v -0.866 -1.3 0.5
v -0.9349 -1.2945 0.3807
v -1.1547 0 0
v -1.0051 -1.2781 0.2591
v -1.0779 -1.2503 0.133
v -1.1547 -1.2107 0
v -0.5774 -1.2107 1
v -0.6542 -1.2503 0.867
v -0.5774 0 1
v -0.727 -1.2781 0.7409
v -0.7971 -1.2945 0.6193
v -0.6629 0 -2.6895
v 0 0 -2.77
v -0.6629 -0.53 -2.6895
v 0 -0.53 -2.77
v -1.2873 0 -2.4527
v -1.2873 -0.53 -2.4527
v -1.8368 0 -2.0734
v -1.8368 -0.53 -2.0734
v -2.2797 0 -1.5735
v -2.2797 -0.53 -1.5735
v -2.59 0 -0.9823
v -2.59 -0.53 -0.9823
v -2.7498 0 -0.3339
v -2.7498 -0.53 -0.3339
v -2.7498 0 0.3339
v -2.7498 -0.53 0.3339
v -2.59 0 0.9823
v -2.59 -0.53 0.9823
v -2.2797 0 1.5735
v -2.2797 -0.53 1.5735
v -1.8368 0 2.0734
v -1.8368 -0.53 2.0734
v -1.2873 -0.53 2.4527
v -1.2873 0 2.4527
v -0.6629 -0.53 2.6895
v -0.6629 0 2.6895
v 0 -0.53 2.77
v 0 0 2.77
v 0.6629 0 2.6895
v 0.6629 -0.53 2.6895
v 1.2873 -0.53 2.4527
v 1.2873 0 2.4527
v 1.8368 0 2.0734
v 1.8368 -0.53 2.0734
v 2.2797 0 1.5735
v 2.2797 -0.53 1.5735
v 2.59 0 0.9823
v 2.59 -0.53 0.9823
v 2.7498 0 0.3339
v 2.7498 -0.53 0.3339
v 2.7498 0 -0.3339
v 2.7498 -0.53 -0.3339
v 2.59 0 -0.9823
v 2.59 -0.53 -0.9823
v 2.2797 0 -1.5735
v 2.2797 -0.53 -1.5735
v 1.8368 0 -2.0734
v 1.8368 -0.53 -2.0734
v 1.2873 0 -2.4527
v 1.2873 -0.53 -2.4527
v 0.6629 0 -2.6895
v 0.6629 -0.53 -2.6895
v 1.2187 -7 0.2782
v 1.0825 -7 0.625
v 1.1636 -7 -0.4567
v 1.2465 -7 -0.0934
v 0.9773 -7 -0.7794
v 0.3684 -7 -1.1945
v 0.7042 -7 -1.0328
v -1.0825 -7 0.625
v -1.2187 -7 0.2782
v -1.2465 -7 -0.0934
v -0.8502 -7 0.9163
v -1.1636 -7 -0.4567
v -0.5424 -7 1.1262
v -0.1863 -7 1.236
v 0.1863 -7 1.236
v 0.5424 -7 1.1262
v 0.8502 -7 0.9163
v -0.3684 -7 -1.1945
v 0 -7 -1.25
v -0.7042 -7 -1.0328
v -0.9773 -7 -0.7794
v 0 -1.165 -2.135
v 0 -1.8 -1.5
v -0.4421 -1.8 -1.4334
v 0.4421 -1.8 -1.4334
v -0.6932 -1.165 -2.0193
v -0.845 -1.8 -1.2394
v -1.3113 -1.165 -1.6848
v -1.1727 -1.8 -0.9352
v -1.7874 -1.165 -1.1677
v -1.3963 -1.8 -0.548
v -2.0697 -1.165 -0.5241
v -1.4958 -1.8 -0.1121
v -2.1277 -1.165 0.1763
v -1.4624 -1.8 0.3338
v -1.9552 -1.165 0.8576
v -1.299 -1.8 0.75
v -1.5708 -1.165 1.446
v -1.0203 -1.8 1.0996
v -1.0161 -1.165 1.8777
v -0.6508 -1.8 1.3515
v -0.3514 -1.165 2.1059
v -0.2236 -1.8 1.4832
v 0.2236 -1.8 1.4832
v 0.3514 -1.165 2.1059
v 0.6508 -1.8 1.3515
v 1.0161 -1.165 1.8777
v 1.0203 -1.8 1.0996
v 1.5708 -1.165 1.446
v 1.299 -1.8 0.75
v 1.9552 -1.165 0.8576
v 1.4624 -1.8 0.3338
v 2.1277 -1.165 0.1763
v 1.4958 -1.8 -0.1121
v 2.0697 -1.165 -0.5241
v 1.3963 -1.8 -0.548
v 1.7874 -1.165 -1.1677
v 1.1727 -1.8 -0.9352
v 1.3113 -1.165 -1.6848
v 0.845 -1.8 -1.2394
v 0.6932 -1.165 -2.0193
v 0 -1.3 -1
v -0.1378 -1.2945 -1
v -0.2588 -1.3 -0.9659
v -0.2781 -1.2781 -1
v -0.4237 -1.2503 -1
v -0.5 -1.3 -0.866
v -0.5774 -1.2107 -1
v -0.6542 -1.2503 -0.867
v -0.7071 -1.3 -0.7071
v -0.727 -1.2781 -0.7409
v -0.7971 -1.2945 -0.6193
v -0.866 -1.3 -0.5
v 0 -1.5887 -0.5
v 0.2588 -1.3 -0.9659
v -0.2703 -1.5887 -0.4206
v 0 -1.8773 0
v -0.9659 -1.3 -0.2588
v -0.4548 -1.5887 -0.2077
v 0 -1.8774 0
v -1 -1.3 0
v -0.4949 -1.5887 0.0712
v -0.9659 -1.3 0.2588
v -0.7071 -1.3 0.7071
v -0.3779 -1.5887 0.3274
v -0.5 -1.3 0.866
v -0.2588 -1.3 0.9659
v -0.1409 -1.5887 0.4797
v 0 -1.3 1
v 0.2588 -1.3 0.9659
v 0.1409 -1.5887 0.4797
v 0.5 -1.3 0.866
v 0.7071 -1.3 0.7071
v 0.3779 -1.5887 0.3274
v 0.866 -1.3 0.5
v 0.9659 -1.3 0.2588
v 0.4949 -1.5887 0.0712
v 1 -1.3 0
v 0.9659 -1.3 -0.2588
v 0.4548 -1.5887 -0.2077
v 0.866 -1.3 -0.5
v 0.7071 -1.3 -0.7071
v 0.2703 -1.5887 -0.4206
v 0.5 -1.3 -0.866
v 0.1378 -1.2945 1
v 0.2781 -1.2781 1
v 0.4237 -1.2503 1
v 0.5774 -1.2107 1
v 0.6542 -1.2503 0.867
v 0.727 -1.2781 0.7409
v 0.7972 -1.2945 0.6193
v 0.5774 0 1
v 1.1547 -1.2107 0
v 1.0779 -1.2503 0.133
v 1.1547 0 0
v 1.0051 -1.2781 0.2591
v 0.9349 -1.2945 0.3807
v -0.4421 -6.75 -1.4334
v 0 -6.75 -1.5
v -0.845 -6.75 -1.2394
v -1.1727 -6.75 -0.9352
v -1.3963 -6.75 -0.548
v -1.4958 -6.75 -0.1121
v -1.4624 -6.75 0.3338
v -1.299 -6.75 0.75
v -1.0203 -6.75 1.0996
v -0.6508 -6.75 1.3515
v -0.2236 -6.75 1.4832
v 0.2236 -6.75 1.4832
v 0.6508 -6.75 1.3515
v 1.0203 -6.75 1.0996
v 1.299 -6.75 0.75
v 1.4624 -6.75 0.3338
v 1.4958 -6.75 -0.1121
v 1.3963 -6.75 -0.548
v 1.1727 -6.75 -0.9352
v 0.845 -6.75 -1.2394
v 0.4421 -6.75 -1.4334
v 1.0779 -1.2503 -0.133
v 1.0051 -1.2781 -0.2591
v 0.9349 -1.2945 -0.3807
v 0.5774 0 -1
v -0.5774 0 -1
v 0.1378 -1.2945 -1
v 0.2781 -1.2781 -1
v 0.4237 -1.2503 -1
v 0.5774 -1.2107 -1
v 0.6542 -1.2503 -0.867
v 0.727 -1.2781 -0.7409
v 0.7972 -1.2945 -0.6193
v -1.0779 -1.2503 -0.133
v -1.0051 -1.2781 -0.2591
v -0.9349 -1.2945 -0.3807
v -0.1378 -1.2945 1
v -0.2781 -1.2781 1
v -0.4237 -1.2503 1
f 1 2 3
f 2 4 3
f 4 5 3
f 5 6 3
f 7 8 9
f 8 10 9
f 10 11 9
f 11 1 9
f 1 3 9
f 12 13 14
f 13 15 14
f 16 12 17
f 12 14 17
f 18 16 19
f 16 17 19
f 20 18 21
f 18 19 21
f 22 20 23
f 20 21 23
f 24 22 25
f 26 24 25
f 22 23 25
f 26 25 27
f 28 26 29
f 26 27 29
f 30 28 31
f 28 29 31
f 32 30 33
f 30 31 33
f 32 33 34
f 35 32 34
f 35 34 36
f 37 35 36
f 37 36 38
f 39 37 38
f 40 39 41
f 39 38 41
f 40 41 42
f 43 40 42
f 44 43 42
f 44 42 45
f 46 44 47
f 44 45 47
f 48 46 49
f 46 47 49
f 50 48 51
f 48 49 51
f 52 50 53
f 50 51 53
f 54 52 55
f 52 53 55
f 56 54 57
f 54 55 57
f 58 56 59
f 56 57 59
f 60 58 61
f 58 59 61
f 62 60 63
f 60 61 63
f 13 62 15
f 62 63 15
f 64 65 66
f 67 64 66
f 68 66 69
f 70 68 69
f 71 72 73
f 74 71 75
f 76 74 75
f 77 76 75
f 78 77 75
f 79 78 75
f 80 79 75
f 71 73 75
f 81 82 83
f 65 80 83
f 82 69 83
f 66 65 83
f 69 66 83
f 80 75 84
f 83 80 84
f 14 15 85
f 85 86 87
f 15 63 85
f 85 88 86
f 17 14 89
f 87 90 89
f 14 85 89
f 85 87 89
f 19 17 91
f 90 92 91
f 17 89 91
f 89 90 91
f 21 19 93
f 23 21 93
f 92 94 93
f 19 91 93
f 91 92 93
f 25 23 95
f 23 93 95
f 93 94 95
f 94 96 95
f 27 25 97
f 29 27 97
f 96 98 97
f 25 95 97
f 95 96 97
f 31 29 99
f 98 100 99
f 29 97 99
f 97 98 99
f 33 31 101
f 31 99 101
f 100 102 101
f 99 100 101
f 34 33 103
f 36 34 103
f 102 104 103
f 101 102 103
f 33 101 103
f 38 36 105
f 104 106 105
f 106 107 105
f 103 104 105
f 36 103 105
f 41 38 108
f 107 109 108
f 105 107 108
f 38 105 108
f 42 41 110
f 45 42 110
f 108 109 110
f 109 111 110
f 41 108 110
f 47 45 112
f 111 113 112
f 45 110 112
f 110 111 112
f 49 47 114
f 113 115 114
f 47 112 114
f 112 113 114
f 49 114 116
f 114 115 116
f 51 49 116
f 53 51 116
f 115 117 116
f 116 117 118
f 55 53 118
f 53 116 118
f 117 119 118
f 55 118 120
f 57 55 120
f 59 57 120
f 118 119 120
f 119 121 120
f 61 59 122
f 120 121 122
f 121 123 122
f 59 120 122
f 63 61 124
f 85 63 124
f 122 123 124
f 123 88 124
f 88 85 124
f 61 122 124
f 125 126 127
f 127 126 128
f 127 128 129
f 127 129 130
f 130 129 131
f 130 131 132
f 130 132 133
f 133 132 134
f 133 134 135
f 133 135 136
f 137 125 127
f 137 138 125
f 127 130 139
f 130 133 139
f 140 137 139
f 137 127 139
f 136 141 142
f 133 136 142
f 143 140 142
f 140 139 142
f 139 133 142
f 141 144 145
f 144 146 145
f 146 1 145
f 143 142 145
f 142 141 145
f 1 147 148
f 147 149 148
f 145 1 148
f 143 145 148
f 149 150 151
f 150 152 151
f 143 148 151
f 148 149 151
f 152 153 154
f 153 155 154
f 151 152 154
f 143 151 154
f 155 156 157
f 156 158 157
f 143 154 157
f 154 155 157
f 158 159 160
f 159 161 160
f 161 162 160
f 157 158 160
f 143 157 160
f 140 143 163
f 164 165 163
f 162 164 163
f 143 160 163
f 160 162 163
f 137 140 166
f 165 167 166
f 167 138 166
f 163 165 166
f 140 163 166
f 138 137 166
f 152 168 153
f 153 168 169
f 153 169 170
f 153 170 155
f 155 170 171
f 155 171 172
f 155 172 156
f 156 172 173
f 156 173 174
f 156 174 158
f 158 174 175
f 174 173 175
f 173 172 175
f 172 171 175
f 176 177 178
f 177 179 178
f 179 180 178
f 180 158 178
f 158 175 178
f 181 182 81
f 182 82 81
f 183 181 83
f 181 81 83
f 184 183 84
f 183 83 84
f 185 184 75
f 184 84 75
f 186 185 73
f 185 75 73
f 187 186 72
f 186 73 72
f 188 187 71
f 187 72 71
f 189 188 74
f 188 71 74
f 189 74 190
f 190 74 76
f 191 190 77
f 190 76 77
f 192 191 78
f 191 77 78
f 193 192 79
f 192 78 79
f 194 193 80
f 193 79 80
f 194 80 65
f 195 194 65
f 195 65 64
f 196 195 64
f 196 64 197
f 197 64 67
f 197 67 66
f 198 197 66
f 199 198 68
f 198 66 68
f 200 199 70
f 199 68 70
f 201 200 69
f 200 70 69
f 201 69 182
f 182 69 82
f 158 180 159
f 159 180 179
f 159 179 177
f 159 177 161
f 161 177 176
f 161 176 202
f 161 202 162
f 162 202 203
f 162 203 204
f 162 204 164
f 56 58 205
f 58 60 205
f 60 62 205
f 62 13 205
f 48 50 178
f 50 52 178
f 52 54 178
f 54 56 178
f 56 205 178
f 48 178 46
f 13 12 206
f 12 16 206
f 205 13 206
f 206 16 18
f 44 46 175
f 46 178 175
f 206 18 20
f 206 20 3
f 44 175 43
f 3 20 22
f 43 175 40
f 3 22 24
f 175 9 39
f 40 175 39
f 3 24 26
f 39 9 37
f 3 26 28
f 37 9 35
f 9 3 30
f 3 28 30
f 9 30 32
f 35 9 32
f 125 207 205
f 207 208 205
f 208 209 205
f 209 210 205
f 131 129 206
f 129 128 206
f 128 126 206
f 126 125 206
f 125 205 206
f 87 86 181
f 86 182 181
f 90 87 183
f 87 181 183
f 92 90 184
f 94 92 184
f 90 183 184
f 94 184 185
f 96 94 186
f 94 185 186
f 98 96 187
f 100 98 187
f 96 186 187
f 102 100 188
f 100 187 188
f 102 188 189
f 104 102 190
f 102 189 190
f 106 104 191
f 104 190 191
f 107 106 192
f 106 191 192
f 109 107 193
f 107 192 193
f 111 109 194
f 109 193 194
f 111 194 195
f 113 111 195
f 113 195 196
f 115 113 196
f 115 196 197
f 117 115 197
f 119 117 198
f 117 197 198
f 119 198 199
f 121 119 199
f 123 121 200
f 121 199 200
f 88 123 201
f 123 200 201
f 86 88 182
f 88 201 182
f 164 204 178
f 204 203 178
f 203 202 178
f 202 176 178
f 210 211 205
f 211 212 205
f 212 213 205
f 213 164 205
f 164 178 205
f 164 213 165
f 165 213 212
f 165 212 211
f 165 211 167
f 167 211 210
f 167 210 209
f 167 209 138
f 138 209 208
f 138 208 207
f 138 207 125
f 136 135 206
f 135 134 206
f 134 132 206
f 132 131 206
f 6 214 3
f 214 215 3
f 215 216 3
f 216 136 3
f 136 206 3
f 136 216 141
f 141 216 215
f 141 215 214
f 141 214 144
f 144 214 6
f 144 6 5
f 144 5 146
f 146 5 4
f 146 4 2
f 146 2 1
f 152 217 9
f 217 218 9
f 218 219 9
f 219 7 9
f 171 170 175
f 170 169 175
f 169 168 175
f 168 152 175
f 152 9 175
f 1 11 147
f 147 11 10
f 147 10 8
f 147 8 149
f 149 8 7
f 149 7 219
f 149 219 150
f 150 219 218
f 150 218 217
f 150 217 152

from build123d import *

# Parameters (mm, degrees)
CUT_EXTRUDE_1_REACH = 10.022


with BuildPart() as part:
    # 草图1 → 旋转1 (revolve)
    with BuildSketch(Plane.XY, mode=Mode.PRIVATE) as revolve_1_sk:
        Polygon((1.5, -1.8), (1.5, -6.75), (1.25, -7), (0, -7), (0, -1.877350269), (1, -1.3), (1, 0), (2.77, 0), (2.77, -0.53), align=None)
    revolve(revolve_1_sk.sketch.rotate(Axis((0, 0, 0), (0, 1, 0)), 90), axis=Axis((0, 0, 0), (0, 1, 0)))

    # 切除-拉伸1: up to this cone (the profile starts inside it)
    cut_extrude_1_end = Plane(origin=(0, 0, 0), z_dir=(0, 1, 0)).offset(-1.877349269) * Cone(1.732e-06, 27.108355455, 15.651015319, align=(Align.CENTER, Align.CENTER, Align.MIN), mode=Mode.PRIVATE)
    # 草图2 → 切除-拉伸1 (cut, up to the surface)
    with BuildSketch(Plane(origin=(0, 0, 0), x_dir=(1, 0, 0), z_dir=(0, 1, 0)), mode=Mode.PRIVATE) as cut_extrude_1_sk1:
        Polygon((1.154700538, 0), (0.577350269, 1), (-0.577350269, 1), (-1.154700538, 0), (-0.577350269, -1), (0.577350269, -1), align=None)
    cut_extrude_1_tool1 = extrude(cut_extrude_1_sk1.sketch, amount=-CUT_EXTRUDE_1_REACH, mode=Mode.PRIVATE) & cut_extrude_1_end
    add(cut_extrude_1_tool1.solids().sort_by_distance((0, 0, 0))[0], mode=Mode.SUBTRACT)


solid = part.part
